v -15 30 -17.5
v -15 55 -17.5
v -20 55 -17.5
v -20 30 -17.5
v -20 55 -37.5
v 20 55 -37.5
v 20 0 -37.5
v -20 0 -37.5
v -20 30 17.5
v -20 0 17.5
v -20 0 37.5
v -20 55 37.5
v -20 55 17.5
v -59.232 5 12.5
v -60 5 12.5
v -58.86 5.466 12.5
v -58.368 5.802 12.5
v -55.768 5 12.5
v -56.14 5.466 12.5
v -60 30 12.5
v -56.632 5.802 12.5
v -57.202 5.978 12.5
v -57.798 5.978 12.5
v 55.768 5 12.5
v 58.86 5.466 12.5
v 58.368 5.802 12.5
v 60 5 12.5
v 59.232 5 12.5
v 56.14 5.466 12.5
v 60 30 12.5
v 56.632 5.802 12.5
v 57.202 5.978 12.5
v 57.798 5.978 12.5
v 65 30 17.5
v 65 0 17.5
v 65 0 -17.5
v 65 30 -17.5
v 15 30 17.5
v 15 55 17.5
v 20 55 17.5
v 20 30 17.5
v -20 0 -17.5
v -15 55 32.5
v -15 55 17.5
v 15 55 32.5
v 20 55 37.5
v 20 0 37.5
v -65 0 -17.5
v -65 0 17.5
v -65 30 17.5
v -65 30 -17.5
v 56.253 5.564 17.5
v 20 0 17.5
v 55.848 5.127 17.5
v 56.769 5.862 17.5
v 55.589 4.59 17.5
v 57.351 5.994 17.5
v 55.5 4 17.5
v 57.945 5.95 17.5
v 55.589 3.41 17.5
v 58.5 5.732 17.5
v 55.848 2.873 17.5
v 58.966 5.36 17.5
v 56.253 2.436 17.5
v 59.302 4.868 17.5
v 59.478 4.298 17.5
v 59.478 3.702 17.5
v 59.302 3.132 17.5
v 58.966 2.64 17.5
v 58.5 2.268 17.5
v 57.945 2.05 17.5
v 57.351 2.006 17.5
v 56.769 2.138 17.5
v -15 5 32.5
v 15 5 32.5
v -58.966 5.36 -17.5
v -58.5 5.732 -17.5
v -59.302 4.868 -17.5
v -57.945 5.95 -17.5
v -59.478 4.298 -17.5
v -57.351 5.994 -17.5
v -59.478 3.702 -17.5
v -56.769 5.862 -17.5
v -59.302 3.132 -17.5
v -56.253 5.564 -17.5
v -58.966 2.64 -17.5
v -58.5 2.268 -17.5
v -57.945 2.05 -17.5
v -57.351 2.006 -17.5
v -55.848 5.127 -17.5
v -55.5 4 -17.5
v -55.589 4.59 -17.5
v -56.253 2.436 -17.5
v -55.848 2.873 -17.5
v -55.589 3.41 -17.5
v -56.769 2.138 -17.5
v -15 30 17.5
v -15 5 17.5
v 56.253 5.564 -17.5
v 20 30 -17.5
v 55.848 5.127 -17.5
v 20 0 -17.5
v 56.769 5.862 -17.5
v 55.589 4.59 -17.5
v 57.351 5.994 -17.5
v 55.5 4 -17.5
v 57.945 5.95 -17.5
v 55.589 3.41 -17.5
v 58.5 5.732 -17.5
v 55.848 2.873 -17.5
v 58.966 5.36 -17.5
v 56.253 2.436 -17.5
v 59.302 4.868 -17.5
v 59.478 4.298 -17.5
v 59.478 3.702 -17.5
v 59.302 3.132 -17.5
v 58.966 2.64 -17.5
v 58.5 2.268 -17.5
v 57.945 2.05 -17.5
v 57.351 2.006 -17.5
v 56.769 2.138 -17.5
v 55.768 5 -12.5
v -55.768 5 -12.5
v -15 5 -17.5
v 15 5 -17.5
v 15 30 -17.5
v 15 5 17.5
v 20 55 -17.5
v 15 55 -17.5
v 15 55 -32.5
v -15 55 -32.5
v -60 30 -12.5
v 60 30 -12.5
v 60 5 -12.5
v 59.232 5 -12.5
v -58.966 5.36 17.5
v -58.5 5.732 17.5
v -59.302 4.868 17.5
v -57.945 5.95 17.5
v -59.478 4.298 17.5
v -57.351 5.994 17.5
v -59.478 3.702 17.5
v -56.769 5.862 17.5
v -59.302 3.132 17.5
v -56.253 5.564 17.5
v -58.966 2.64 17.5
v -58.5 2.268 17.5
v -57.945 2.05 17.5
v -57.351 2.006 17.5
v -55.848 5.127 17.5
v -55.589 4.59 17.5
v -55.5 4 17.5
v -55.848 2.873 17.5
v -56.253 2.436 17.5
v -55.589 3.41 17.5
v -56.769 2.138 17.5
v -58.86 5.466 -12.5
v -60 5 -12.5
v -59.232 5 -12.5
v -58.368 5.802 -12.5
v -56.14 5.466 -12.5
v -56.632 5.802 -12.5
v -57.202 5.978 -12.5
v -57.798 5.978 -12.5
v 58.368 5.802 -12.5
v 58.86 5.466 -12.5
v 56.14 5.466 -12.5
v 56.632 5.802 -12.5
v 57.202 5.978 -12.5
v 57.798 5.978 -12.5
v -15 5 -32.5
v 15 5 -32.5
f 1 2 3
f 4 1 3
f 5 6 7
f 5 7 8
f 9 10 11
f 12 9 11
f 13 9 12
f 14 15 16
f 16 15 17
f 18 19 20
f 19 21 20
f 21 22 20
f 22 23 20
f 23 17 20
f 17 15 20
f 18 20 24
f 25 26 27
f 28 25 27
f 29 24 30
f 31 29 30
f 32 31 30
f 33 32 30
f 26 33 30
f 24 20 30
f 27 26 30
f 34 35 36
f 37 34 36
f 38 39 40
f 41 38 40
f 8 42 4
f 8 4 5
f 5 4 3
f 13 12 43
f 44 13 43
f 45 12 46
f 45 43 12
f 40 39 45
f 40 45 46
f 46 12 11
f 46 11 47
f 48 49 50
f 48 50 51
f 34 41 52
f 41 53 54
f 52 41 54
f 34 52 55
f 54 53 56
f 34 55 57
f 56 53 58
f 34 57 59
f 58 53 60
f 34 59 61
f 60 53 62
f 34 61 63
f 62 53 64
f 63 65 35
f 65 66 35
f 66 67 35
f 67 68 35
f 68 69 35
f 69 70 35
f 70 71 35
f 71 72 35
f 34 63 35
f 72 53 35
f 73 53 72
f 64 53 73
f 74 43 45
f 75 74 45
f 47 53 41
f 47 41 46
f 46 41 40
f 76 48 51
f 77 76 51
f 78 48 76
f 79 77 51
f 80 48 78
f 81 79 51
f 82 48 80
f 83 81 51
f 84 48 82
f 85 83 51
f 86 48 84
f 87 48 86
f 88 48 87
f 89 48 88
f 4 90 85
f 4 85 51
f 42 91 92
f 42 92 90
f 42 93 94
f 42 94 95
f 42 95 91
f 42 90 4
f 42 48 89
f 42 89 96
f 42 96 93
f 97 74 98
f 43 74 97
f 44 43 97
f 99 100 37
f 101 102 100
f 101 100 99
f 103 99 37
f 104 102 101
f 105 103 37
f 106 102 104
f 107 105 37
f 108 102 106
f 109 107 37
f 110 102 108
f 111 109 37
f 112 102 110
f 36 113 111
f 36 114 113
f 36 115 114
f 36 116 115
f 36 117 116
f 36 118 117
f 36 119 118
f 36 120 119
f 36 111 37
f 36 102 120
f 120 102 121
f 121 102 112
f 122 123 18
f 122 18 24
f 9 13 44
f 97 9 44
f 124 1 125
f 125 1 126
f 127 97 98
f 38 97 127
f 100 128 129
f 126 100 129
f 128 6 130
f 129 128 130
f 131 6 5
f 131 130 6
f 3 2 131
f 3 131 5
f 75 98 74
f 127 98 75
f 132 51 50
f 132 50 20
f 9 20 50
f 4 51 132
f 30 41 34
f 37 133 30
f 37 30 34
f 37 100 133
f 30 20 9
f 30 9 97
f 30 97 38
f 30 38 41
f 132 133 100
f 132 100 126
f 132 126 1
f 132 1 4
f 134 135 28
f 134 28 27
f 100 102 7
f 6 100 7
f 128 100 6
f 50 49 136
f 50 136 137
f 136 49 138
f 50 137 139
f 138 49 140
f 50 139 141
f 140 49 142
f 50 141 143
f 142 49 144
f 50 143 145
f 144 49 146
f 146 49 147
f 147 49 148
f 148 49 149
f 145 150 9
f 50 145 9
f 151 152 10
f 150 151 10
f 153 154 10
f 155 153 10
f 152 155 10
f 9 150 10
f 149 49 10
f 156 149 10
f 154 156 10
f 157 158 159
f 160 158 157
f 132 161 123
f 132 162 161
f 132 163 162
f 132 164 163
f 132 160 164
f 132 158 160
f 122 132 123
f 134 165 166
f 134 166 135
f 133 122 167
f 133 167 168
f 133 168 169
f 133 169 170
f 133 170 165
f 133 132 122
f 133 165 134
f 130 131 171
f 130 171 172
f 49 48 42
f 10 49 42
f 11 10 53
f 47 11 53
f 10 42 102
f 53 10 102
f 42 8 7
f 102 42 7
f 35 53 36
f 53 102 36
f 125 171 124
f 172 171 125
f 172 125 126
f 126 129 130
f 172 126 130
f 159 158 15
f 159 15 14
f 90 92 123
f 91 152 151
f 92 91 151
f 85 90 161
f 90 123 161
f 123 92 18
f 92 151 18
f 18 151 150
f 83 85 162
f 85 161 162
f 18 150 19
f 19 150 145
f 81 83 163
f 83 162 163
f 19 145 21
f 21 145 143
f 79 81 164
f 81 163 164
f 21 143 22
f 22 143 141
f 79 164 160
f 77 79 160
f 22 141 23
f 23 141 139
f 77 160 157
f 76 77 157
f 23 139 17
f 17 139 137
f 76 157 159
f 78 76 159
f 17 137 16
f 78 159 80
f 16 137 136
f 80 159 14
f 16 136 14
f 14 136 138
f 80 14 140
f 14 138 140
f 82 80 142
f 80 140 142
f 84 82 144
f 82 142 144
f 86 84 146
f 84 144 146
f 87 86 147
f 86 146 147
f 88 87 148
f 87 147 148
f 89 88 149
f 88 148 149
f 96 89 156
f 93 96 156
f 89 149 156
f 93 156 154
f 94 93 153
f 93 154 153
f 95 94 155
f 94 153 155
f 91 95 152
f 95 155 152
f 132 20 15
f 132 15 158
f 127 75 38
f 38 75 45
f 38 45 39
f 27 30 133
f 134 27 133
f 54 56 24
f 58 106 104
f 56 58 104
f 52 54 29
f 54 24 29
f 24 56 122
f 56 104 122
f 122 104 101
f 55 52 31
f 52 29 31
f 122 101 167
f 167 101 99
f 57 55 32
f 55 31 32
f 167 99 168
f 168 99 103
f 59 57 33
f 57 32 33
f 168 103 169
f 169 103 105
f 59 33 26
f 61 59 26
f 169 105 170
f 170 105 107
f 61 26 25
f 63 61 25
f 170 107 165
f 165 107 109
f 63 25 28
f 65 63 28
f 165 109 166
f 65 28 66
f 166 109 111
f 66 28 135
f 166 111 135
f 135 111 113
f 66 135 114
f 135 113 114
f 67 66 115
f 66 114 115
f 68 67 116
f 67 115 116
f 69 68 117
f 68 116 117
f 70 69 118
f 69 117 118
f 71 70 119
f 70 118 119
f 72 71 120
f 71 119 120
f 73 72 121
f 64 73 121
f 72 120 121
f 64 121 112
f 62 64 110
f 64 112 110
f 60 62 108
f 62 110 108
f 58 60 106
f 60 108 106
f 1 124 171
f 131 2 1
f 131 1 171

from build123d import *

# Parameters (mm, degrees)
SKETCH1_W           = 130
SKETCH1_H           = 35
BOSS_EXTRUDE1_DEPTH = 30
SKETCH2_W           = 120
SKETCH2_H           = 25
CUT_EXTRUDE1_DEPTH  = 25
SKETCH3_R           = 2
CUT_EXTRUDE2_DEPTH  = 80.686887253
SKETCH4_R           = 2
CUT_EXTRUDE3_DEPTH  = 80.686887253
SKETCH6_W           = 40
SKETCH6_H           = 55
BOSS_EXTRUDE2_DEPTH = 20
SKETCH7_W           = 30
SKETCH7_H           = 15
CUT_EXTRUDE4_DEPTH  = 50
SKETCH8_W           = 40
SKETCH8_H           = 55
BOSS_EXTRUDE3_DEPTH = 20
SKETCH9_W           = 30
SKETCH9_H           = 15
CUT_EXTRUDE5_DEPTH  = 50


with BuildPart() as part:
    # Sketch1 → Boss-Extrude1 (new body)
    with BuildSketch(Plane(origin=(0, 0, 0), x_dir=(1, 0, 0), z_dir=(0, 1, 0))):
        Rectangle(SKETCH1_W, SKETCH1_H)
    extrude(amount=BOSS_EXTRUDE1_DEPTH)

    # Sketch2 → Cut-Extrude1 (cut)
    with BuildSketch(Plane(origin=(0, 30, 0), x_dir=(1, 0, 0), z_dir=(0, 1, 0))):
        Rectangle(SKETCH2_W, SKETCH2_H)
    extrude(amount=-CUT_EXTRUDE1_DEPTH, mode=Mode.SUBTRACT)

    # Sketch3 → Cut-Extrude2 (cut, through all)
    with BuildSketch(Plane.XY.offset(17.5)):
        with Locations((-57.5, 4)):
            Circle(SKETCH3_R)
    extrude(amount=-CUT_EXTRUDE2_DEPTH, mode=Mode.SUBTRACT)

    # Sketch4 → Cut-Extrude3 (cut, through all)
    with BuildSketch(Plane(origin=(0, 0, -17.5), x_dir=(-1, 0, 0), z_dir=(0, 0, -1))):
        with Locations((-57.5, 4)):
            Circle(SKETCH4_R)
    extrude(amount=-CUT_EXTRUDE3_DEPTH, mode=Mode.SUBTRACT)

    # Sketch6 → Boss-Extrude2 (add)
    with BuildSketch(Plane(origin=(0, 0, -17.5), x_dir=(-1, 0, 0), z_dir=(0, 0, -1))):
        with Locations((0, 27.5)):
            Rectangle(SKETCH6_W, SKETCH6_H)
    extrude(amount=BOSS_EXTRUDE2_DEPTH)

    # Sketch7 → Cut-Extrude4 (cut)
    with BuildSketch(Plane(origin=(0, 55, 0), x_dir=(1, 0, 0), z_dir=(0, 1, 0))):
        with Locations((0, 25)):
            Rectangle(SKETCH7_W, SKETCH7_H)
    extrude(amount=-CUT_EXTRUDE4_DEPTH, mode=Mode.SUBTRACT)

    # Sketch8 → Boss-Extrude3 (add)
    with BuildSketch(Plane.XY.offset(17.5)):
        with Locations((0, 27.5)):
            Rectangle(SKETCH8_W, SKETCH8_H)
    extrude(amount=BOSS_EXTRUDE3_DEPTH)

    # Sketch9 → Cut-Extrude5 (cut)
    with BuildSketch(Plane(origin=(0, 55, 0), x_dir=(1, 0, 0), z_dir=(0, 1, 0))):
        with Locations((0, -25)):
            Rectangle(SKETCH9_W, SKETCH9_H)
    extrude(amount=-CUT_EXTRUDE5_DEPTH, mode=Mode.SUBTRACT)


solid = part.part
